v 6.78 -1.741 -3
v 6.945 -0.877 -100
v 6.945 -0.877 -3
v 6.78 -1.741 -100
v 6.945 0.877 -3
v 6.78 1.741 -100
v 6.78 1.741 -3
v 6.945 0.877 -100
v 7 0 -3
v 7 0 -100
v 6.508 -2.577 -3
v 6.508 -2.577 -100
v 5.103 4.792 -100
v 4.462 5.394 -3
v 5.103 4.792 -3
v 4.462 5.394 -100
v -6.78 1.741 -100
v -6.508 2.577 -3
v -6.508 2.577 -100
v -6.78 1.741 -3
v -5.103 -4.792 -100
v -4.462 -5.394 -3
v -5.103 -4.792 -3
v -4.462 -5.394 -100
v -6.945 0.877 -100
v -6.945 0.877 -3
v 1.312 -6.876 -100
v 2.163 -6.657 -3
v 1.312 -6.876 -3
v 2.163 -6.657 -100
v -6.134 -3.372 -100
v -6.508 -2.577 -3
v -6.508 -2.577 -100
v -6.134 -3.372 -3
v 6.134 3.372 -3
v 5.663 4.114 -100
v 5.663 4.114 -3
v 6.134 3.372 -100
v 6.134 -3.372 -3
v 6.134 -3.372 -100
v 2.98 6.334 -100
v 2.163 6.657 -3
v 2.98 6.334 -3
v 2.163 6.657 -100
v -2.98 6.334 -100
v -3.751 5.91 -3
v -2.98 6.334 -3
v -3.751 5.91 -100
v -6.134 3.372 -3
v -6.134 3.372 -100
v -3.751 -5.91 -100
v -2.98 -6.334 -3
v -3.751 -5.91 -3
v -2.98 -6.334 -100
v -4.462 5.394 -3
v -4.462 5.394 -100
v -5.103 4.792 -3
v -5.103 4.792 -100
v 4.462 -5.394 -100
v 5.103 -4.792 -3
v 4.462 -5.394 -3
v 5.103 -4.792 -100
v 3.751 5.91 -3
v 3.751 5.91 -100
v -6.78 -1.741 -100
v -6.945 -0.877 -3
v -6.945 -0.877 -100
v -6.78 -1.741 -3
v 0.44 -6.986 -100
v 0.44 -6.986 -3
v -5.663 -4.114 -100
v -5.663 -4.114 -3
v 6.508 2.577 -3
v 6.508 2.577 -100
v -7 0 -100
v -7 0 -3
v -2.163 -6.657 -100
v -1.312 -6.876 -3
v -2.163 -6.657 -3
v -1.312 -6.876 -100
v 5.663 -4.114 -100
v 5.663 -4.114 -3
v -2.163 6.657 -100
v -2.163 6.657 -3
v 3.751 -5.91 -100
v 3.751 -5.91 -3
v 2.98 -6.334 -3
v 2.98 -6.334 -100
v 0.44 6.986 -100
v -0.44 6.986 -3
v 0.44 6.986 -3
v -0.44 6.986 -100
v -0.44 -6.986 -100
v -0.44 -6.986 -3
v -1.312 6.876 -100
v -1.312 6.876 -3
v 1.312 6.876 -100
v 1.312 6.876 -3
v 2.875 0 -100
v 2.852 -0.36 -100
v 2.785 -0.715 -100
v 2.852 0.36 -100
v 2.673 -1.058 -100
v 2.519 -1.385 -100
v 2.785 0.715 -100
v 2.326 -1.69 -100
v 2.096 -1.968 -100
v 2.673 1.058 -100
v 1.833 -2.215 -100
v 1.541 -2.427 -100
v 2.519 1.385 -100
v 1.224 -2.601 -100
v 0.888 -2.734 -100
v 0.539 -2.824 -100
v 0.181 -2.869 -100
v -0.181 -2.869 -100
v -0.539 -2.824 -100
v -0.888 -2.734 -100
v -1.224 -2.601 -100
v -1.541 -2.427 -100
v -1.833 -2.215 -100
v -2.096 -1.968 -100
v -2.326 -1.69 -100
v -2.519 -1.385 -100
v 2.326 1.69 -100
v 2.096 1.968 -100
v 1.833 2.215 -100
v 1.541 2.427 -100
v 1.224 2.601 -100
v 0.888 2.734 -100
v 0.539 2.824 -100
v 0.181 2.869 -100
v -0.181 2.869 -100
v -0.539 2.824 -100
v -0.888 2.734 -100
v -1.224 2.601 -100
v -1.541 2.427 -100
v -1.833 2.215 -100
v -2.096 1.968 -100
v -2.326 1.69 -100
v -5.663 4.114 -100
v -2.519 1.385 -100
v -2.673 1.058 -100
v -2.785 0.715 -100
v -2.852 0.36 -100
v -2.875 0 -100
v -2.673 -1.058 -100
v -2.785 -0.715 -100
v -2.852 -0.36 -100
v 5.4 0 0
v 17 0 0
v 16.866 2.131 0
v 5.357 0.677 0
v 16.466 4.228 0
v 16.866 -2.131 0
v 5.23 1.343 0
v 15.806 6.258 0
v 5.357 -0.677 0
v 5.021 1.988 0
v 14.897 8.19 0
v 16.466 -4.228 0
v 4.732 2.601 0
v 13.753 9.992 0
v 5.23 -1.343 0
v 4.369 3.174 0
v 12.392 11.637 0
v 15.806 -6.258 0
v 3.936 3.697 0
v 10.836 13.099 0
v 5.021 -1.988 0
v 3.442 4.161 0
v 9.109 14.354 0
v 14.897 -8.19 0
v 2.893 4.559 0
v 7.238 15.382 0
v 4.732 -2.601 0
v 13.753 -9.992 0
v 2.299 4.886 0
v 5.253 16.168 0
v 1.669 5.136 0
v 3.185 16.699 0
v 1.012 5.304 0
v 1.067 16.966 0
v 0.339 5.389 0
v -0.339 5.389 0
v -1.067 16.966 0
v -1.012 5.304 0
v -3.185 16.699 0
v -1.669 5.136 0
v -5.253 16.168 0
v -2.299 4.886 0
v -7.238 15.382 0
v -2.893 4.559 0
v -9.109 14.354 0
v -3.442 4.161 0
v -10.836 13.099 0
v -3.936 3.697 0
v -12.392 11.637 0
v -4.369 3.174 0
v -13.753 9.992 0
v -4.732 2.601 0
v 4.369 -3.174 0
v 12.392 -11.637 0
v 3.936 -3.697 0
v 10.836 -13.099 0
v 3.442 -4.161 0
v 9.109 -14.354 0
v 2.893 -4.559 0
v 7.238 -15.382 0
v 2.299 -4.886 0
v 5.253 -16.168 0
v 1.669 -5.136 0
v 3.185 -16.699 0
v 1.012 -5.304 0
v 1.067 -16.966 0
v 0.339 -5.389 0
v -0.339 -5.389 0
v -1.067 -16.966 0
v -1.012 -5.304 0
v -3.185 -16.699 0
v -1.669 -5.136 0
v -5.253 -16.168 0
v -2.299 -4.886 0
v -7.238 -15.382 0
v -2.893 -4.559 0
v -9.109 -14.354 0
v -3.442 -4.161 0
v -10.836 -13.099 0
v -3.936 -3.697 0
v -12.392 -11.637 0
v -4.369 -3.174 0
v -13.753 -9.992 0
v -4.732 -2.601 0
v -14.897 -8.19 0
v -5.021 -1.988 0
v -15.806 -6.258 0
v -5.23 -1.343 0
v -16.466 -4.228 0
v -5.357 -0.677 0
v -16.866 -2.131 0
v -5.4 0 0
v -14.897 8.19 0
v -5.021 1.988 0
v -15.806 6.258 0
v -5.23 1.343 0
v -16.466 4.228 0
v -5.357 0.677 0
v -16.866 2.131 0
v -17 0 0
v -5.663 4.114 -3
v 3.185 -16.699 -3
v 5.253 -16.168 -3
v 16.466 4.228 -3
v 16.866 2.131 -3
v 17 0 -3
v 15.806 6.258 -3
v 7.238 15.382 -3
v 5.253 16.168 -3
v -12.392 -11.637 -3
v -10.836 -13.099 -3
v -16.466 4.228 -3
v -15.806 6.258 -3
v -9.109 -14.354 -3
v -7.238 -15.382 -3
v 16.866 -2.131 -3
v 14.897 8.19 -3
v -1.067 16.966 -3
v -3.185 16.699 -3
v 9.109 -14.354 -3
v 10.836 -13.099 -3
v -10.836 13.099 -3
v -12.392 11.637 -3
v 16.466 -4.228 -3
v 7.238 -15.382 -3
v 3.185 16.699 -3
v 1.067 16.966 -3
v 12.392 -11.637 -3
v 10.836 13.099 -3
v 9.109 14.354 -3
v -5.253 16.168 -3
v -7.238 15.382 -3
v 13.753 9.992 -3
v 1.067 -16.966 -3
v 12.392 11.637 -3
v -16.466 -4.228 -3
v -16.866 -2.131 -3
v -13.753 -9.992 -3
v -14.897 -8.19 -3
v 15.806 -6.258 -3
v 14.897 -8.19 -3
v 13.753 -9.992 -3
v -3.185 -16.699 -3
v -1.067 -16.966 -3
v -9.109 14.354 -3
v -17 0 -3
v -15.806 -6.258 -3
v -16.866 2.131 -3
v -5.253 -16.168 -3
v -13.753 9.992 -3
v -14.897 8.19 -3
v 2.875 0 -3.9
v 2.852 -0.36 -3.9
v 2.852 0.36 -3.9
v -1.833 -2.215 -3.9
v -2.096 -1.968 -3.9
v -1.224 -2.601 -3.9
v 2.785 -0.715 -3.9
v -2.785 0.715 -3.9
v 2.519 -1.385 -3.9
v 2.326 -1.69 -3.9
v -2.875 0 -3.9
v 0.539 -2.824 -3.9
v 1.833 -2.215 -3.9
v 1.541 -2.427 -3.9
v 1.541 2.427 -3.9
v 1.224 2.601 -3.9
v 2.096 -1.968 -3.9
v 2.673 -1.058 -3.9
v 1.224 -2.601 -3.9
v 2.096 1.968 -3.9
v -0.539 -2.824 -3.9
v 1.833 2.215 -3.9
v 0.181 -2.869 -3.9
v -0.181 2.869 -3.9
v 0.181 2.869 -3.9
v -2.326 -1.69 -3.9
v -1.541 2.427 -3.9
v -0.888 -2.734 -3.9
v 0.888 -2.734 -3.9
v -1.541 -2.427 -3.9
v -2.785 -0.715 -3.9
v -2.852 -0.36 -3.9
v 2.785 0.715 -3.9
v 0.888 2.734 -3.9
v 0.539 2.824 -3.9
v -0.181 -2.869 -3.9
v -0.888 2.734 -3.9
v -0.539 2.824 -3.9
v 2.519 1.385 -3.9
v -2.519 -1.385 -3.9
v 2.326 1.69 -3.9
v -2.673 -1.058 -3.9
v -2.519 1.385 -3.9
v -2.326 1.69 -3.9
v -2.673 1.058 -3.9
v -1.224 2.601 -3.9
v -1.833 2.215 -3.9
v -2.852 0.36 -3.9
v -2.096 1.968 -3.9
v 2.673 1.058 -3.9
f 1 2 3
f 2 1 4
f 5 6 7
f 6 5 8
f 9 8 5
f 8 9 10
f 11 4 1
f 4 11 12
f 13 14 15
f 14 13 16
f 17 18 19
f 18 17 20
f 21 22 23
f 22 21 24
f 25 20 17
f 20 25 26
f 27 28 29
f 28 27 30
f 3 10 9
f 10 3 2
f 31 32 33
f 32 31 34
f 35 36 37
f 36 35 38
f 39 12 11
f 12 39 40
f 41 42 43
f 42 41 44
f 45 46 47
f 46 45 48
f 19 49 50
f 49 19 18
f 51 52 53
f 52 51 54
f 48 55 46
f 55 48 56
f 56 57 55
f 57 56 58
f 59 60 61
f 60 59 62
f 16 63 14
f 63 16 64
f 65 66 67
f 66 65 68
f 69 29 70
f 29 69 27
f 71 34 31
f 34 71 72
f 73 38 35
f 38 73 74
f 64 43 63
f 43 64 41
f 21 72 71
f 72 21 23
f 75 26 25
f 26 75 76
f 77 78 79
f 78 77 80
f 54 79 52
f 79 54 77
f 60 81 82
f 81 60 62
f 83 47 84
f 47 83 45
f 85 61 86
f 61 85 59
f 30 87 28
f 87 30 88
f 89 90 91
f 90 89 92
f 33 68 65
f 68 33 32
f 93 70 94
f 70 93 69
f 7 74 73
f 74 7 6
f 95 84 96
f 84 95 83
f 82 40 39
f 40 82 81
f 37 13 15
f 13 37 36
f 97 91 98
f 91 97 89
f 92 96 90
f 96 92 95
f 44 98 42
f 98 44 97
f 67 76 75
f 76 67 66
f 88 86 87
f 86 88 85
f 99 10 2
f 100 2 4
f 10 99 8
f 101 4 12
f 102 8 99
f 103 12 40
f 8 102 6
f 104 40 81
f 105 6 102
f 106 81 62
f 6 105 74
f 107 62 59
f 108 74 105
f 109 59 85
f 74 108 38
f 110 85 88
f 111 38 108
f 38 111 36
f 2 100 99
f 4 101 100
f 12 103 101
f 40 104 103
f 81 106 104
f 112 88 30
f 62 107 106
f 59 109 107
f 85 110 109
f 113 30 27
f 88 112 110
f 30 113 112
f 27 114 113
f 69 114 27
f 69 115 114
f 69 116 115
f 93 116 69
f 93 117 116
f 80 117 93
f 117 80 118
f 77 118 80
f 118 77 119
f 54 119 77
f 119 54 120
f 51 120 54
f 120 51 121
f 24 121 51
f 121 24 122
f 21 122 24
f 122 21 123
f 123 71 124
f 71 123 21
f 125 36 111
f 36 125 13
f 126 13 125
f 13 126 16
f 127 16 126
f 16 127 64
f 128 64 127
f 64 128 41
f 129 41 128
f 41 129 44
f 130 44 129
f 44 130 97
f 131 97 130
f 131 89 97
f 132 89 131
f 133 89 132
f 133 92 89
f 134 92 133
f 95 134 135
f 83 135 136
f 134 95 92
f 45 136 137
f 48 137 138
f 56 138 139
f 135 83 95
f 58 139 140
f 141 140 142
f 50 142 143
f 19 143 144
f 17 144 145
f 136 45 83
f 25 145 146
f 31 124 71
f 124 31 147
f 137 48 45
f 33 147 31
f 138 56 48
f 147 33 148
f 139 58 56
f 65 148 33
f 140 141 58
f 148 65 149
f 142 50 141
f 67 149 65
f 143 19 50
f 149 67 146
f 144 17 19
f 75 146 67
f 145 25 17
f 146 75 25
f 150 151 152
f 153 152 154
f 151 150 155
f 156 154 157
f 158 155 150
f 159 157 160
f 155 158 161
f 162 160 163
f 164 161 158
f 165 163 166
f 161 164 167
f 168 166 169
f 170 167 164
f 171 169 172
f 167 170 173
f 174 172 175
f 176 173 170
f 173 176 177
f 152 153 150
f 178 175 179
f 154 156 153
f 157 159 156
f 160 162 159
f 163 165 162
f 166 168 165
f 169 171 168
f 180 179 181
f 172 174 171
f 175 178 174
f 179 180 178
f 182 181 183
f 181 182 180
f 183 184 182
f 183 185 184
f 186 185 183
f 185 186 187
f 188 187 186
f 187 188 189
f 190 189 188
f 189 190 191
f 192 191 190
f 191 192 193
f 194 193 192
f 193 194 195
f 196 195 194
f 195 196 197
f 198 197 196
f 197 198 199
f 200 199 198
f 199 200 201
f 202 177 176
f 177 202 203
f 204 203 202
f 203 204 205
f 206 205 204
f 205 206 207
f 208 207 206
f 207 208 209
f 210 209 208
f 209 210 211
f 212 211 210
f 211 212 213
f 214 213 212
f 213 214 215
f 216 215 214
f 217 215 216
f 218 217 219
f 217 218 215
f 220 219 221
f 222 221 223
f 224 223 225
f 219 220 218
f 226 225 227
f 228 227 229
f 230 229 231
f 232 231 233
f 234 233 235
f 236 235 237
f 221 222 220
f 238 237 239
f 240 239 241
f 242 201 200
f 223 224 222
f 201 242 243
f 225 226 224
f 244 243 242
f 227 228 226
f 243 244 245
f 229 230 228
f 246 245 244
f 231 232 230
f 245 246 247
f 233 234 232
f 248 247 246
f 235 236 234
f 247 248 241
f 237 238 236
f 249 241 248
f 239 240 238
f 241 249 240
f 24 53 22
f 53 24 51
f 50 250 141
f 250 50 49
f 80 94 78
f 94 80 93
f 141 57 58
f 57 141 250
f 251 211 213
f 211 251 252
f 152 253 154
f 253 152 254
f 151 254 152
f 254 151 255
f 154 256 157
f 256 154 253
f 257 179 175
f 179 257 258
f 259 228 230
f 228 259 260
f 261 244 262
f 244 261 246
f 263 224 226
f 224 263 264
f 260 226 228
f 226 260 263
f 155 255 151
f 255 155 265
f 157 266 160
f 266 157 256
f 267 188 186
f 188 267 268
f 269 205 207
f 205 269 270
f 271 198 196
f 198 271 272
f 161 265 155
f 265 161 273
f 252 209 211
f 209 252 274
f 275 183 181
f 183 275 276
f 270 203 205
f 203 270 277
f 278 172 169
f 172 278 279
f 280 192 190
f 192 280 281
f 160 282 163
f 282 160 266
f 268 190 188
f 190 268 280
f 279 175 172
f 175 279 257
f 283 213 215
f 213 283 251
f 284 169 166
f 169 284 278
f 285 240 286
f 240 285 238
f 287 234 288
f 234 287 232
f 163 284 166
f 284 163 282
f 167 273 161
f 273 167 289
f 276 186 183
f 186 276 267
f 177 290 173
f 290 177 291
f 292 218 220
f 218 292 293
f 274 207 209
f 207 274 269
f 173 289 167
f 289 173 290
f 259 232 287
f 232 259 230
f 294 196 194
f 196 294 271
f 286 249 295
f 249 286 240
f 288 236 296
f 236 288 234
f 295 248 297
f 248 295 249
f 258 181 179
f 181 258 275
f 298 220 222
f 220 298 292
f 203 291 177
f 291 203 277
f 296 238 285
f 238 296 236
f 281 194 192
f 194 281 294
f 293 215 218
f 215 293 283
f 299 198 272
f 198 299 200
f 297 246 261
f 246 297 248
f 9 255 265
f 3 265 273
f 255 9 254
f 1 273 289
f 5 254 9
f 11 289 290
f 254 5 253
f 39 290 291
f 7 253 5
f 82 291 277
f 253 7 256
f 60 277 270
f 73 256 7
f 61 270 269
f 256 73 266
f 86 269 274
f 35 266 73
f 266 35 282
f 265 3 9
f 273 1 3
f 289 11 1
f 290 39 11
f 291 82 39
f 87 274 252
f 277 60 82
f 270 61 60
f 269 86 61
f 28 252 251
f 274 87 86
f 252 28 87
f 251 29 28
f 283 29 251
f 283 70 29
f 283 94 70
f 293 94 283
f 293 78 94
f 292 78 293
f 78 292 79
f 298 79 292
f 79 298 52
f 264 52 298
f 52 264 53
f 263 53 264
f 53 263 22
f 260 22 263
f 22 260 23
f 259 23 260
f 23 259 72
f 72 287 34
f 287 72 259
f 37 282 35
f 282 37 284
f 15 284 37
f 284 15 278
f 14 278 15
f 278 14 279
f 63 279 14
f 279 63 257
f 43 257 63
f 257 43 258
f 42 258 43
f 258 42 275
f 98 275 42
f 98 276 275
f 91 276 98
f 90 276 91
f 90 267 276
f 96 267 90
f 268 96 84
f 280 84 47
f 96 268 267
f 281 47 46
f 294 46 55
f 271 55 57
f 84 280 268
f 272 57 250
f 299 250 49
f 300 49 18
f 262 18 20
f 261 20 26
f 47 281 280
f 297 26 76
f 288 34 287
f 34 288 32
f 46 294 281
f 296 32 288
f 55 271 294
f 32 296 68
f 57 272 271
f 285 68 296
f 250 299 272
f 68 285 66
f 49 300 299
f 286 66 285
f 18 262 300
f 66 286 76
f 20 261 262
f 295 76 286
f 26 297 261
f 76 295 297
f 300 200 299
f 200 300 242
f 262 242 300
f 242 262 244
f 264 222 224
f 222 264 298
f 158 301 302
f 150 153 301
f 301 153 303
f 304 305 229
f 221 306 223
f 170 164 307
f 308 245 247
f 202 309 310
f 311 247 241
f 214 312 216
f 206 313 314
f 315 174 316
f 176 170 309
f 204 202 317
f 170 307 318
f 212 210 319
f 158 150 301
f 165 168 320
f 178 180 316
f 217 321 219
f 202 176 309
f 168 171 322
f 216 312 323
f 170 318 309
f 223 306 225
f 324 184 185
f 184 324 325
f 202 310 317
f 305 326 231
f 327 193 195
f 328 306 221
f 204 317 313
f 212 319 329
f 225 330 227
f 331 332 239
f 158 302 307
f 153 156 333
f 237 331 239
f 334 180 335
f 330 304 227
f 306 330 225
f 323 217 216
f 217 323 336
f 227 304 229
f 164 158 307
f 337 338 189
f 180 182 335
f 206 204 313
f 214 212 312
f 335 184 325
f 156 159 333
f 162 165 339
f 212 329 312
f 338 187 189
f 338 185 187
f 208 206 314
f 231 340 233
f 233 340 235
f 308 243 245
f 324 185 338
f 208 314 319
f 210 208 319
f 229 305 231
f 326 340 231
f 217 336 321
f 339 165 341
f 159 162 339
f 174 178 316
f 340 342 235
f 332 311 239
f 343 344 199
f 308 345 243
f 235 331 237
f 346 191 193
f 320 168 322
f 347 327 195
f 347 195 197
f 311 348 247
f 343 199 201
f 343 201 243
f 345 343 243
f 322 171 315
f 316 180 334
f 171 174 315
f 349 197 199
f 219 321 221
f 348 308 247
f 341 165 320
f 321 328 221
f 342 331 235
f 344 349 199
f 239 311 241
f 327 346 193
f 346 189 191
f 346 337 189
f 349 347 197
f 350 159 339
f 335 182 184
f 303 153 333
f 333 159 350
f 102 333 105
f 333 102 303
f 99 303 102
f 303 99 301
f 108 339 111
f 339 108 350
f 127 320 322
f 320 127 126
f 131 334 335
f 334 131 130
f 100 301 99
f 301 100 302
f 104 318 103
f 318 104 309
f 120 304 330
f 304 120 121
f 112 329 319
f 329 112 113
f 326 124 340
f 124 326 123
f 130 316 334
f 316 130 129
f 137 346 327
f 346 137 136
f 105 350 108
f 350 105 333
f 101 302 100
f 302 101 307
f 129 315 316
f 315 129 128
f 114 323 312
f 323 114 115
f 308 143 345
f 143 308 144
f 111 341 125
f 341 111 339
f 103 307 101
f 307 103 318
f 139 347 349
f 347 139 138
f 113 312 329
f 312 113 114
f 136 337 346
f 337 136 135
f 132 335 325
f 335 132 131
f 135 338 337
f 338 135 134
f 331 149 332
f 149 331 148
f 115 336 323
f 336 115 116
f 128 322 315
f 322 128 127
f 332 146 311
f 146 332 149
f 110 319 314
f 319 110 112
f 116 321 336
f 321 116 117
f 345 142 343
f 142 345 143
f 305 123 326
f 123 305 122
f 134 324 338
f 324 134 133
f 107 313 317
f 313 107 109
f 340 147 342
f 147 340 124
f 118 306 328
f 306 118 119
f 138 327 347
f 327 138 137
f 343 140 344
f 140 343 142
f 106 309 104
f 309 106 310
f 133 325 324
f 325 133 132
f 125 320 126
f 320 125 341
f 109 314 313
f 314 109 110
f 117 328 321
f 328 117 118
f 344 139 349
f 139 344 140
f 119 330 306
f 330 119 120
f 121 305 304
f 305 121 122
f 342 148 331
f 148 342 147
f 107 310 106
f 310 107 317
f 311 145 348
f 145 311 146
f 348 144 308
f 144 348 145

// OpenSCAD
$fn = 50;


difference() {
	union() {
		translate(v = [0, 0, -100.0000000000]) {
			cylinder(h = 100, r = 7.0000000000);
		}
		translate(v = [0, 0, -3.0000000000]) {
			cylinder(h = 3, r = 17.0000000000);
		}
	}
	union() {
		translate(v = [0, 0, 0]) {
			rotate(a = [0, 0, 0]) {
				difference() {
					union() {
						#translate(v = [0, 0, -100.0000000000]) {
							cylinder(h = 100, r = 2.6000000000);
						}
						#translate(v = [0, 0, -3.9000000000]) {
							cylinder(h = 3.9000000000, r1 = 2.8750000000, r2 = 5.4000000000);
						}
						#translate(v = [0, 0, -100.0000000000]) {
							cylinder(h = 100, r = 2.8750000000);
						}
						#translate(v = [0, 0, -100.0000000000]) {
							cylinder(h = 100, r = 2.6000000000);
						}
					}
					union();
				}
			}
		}
	}
}
